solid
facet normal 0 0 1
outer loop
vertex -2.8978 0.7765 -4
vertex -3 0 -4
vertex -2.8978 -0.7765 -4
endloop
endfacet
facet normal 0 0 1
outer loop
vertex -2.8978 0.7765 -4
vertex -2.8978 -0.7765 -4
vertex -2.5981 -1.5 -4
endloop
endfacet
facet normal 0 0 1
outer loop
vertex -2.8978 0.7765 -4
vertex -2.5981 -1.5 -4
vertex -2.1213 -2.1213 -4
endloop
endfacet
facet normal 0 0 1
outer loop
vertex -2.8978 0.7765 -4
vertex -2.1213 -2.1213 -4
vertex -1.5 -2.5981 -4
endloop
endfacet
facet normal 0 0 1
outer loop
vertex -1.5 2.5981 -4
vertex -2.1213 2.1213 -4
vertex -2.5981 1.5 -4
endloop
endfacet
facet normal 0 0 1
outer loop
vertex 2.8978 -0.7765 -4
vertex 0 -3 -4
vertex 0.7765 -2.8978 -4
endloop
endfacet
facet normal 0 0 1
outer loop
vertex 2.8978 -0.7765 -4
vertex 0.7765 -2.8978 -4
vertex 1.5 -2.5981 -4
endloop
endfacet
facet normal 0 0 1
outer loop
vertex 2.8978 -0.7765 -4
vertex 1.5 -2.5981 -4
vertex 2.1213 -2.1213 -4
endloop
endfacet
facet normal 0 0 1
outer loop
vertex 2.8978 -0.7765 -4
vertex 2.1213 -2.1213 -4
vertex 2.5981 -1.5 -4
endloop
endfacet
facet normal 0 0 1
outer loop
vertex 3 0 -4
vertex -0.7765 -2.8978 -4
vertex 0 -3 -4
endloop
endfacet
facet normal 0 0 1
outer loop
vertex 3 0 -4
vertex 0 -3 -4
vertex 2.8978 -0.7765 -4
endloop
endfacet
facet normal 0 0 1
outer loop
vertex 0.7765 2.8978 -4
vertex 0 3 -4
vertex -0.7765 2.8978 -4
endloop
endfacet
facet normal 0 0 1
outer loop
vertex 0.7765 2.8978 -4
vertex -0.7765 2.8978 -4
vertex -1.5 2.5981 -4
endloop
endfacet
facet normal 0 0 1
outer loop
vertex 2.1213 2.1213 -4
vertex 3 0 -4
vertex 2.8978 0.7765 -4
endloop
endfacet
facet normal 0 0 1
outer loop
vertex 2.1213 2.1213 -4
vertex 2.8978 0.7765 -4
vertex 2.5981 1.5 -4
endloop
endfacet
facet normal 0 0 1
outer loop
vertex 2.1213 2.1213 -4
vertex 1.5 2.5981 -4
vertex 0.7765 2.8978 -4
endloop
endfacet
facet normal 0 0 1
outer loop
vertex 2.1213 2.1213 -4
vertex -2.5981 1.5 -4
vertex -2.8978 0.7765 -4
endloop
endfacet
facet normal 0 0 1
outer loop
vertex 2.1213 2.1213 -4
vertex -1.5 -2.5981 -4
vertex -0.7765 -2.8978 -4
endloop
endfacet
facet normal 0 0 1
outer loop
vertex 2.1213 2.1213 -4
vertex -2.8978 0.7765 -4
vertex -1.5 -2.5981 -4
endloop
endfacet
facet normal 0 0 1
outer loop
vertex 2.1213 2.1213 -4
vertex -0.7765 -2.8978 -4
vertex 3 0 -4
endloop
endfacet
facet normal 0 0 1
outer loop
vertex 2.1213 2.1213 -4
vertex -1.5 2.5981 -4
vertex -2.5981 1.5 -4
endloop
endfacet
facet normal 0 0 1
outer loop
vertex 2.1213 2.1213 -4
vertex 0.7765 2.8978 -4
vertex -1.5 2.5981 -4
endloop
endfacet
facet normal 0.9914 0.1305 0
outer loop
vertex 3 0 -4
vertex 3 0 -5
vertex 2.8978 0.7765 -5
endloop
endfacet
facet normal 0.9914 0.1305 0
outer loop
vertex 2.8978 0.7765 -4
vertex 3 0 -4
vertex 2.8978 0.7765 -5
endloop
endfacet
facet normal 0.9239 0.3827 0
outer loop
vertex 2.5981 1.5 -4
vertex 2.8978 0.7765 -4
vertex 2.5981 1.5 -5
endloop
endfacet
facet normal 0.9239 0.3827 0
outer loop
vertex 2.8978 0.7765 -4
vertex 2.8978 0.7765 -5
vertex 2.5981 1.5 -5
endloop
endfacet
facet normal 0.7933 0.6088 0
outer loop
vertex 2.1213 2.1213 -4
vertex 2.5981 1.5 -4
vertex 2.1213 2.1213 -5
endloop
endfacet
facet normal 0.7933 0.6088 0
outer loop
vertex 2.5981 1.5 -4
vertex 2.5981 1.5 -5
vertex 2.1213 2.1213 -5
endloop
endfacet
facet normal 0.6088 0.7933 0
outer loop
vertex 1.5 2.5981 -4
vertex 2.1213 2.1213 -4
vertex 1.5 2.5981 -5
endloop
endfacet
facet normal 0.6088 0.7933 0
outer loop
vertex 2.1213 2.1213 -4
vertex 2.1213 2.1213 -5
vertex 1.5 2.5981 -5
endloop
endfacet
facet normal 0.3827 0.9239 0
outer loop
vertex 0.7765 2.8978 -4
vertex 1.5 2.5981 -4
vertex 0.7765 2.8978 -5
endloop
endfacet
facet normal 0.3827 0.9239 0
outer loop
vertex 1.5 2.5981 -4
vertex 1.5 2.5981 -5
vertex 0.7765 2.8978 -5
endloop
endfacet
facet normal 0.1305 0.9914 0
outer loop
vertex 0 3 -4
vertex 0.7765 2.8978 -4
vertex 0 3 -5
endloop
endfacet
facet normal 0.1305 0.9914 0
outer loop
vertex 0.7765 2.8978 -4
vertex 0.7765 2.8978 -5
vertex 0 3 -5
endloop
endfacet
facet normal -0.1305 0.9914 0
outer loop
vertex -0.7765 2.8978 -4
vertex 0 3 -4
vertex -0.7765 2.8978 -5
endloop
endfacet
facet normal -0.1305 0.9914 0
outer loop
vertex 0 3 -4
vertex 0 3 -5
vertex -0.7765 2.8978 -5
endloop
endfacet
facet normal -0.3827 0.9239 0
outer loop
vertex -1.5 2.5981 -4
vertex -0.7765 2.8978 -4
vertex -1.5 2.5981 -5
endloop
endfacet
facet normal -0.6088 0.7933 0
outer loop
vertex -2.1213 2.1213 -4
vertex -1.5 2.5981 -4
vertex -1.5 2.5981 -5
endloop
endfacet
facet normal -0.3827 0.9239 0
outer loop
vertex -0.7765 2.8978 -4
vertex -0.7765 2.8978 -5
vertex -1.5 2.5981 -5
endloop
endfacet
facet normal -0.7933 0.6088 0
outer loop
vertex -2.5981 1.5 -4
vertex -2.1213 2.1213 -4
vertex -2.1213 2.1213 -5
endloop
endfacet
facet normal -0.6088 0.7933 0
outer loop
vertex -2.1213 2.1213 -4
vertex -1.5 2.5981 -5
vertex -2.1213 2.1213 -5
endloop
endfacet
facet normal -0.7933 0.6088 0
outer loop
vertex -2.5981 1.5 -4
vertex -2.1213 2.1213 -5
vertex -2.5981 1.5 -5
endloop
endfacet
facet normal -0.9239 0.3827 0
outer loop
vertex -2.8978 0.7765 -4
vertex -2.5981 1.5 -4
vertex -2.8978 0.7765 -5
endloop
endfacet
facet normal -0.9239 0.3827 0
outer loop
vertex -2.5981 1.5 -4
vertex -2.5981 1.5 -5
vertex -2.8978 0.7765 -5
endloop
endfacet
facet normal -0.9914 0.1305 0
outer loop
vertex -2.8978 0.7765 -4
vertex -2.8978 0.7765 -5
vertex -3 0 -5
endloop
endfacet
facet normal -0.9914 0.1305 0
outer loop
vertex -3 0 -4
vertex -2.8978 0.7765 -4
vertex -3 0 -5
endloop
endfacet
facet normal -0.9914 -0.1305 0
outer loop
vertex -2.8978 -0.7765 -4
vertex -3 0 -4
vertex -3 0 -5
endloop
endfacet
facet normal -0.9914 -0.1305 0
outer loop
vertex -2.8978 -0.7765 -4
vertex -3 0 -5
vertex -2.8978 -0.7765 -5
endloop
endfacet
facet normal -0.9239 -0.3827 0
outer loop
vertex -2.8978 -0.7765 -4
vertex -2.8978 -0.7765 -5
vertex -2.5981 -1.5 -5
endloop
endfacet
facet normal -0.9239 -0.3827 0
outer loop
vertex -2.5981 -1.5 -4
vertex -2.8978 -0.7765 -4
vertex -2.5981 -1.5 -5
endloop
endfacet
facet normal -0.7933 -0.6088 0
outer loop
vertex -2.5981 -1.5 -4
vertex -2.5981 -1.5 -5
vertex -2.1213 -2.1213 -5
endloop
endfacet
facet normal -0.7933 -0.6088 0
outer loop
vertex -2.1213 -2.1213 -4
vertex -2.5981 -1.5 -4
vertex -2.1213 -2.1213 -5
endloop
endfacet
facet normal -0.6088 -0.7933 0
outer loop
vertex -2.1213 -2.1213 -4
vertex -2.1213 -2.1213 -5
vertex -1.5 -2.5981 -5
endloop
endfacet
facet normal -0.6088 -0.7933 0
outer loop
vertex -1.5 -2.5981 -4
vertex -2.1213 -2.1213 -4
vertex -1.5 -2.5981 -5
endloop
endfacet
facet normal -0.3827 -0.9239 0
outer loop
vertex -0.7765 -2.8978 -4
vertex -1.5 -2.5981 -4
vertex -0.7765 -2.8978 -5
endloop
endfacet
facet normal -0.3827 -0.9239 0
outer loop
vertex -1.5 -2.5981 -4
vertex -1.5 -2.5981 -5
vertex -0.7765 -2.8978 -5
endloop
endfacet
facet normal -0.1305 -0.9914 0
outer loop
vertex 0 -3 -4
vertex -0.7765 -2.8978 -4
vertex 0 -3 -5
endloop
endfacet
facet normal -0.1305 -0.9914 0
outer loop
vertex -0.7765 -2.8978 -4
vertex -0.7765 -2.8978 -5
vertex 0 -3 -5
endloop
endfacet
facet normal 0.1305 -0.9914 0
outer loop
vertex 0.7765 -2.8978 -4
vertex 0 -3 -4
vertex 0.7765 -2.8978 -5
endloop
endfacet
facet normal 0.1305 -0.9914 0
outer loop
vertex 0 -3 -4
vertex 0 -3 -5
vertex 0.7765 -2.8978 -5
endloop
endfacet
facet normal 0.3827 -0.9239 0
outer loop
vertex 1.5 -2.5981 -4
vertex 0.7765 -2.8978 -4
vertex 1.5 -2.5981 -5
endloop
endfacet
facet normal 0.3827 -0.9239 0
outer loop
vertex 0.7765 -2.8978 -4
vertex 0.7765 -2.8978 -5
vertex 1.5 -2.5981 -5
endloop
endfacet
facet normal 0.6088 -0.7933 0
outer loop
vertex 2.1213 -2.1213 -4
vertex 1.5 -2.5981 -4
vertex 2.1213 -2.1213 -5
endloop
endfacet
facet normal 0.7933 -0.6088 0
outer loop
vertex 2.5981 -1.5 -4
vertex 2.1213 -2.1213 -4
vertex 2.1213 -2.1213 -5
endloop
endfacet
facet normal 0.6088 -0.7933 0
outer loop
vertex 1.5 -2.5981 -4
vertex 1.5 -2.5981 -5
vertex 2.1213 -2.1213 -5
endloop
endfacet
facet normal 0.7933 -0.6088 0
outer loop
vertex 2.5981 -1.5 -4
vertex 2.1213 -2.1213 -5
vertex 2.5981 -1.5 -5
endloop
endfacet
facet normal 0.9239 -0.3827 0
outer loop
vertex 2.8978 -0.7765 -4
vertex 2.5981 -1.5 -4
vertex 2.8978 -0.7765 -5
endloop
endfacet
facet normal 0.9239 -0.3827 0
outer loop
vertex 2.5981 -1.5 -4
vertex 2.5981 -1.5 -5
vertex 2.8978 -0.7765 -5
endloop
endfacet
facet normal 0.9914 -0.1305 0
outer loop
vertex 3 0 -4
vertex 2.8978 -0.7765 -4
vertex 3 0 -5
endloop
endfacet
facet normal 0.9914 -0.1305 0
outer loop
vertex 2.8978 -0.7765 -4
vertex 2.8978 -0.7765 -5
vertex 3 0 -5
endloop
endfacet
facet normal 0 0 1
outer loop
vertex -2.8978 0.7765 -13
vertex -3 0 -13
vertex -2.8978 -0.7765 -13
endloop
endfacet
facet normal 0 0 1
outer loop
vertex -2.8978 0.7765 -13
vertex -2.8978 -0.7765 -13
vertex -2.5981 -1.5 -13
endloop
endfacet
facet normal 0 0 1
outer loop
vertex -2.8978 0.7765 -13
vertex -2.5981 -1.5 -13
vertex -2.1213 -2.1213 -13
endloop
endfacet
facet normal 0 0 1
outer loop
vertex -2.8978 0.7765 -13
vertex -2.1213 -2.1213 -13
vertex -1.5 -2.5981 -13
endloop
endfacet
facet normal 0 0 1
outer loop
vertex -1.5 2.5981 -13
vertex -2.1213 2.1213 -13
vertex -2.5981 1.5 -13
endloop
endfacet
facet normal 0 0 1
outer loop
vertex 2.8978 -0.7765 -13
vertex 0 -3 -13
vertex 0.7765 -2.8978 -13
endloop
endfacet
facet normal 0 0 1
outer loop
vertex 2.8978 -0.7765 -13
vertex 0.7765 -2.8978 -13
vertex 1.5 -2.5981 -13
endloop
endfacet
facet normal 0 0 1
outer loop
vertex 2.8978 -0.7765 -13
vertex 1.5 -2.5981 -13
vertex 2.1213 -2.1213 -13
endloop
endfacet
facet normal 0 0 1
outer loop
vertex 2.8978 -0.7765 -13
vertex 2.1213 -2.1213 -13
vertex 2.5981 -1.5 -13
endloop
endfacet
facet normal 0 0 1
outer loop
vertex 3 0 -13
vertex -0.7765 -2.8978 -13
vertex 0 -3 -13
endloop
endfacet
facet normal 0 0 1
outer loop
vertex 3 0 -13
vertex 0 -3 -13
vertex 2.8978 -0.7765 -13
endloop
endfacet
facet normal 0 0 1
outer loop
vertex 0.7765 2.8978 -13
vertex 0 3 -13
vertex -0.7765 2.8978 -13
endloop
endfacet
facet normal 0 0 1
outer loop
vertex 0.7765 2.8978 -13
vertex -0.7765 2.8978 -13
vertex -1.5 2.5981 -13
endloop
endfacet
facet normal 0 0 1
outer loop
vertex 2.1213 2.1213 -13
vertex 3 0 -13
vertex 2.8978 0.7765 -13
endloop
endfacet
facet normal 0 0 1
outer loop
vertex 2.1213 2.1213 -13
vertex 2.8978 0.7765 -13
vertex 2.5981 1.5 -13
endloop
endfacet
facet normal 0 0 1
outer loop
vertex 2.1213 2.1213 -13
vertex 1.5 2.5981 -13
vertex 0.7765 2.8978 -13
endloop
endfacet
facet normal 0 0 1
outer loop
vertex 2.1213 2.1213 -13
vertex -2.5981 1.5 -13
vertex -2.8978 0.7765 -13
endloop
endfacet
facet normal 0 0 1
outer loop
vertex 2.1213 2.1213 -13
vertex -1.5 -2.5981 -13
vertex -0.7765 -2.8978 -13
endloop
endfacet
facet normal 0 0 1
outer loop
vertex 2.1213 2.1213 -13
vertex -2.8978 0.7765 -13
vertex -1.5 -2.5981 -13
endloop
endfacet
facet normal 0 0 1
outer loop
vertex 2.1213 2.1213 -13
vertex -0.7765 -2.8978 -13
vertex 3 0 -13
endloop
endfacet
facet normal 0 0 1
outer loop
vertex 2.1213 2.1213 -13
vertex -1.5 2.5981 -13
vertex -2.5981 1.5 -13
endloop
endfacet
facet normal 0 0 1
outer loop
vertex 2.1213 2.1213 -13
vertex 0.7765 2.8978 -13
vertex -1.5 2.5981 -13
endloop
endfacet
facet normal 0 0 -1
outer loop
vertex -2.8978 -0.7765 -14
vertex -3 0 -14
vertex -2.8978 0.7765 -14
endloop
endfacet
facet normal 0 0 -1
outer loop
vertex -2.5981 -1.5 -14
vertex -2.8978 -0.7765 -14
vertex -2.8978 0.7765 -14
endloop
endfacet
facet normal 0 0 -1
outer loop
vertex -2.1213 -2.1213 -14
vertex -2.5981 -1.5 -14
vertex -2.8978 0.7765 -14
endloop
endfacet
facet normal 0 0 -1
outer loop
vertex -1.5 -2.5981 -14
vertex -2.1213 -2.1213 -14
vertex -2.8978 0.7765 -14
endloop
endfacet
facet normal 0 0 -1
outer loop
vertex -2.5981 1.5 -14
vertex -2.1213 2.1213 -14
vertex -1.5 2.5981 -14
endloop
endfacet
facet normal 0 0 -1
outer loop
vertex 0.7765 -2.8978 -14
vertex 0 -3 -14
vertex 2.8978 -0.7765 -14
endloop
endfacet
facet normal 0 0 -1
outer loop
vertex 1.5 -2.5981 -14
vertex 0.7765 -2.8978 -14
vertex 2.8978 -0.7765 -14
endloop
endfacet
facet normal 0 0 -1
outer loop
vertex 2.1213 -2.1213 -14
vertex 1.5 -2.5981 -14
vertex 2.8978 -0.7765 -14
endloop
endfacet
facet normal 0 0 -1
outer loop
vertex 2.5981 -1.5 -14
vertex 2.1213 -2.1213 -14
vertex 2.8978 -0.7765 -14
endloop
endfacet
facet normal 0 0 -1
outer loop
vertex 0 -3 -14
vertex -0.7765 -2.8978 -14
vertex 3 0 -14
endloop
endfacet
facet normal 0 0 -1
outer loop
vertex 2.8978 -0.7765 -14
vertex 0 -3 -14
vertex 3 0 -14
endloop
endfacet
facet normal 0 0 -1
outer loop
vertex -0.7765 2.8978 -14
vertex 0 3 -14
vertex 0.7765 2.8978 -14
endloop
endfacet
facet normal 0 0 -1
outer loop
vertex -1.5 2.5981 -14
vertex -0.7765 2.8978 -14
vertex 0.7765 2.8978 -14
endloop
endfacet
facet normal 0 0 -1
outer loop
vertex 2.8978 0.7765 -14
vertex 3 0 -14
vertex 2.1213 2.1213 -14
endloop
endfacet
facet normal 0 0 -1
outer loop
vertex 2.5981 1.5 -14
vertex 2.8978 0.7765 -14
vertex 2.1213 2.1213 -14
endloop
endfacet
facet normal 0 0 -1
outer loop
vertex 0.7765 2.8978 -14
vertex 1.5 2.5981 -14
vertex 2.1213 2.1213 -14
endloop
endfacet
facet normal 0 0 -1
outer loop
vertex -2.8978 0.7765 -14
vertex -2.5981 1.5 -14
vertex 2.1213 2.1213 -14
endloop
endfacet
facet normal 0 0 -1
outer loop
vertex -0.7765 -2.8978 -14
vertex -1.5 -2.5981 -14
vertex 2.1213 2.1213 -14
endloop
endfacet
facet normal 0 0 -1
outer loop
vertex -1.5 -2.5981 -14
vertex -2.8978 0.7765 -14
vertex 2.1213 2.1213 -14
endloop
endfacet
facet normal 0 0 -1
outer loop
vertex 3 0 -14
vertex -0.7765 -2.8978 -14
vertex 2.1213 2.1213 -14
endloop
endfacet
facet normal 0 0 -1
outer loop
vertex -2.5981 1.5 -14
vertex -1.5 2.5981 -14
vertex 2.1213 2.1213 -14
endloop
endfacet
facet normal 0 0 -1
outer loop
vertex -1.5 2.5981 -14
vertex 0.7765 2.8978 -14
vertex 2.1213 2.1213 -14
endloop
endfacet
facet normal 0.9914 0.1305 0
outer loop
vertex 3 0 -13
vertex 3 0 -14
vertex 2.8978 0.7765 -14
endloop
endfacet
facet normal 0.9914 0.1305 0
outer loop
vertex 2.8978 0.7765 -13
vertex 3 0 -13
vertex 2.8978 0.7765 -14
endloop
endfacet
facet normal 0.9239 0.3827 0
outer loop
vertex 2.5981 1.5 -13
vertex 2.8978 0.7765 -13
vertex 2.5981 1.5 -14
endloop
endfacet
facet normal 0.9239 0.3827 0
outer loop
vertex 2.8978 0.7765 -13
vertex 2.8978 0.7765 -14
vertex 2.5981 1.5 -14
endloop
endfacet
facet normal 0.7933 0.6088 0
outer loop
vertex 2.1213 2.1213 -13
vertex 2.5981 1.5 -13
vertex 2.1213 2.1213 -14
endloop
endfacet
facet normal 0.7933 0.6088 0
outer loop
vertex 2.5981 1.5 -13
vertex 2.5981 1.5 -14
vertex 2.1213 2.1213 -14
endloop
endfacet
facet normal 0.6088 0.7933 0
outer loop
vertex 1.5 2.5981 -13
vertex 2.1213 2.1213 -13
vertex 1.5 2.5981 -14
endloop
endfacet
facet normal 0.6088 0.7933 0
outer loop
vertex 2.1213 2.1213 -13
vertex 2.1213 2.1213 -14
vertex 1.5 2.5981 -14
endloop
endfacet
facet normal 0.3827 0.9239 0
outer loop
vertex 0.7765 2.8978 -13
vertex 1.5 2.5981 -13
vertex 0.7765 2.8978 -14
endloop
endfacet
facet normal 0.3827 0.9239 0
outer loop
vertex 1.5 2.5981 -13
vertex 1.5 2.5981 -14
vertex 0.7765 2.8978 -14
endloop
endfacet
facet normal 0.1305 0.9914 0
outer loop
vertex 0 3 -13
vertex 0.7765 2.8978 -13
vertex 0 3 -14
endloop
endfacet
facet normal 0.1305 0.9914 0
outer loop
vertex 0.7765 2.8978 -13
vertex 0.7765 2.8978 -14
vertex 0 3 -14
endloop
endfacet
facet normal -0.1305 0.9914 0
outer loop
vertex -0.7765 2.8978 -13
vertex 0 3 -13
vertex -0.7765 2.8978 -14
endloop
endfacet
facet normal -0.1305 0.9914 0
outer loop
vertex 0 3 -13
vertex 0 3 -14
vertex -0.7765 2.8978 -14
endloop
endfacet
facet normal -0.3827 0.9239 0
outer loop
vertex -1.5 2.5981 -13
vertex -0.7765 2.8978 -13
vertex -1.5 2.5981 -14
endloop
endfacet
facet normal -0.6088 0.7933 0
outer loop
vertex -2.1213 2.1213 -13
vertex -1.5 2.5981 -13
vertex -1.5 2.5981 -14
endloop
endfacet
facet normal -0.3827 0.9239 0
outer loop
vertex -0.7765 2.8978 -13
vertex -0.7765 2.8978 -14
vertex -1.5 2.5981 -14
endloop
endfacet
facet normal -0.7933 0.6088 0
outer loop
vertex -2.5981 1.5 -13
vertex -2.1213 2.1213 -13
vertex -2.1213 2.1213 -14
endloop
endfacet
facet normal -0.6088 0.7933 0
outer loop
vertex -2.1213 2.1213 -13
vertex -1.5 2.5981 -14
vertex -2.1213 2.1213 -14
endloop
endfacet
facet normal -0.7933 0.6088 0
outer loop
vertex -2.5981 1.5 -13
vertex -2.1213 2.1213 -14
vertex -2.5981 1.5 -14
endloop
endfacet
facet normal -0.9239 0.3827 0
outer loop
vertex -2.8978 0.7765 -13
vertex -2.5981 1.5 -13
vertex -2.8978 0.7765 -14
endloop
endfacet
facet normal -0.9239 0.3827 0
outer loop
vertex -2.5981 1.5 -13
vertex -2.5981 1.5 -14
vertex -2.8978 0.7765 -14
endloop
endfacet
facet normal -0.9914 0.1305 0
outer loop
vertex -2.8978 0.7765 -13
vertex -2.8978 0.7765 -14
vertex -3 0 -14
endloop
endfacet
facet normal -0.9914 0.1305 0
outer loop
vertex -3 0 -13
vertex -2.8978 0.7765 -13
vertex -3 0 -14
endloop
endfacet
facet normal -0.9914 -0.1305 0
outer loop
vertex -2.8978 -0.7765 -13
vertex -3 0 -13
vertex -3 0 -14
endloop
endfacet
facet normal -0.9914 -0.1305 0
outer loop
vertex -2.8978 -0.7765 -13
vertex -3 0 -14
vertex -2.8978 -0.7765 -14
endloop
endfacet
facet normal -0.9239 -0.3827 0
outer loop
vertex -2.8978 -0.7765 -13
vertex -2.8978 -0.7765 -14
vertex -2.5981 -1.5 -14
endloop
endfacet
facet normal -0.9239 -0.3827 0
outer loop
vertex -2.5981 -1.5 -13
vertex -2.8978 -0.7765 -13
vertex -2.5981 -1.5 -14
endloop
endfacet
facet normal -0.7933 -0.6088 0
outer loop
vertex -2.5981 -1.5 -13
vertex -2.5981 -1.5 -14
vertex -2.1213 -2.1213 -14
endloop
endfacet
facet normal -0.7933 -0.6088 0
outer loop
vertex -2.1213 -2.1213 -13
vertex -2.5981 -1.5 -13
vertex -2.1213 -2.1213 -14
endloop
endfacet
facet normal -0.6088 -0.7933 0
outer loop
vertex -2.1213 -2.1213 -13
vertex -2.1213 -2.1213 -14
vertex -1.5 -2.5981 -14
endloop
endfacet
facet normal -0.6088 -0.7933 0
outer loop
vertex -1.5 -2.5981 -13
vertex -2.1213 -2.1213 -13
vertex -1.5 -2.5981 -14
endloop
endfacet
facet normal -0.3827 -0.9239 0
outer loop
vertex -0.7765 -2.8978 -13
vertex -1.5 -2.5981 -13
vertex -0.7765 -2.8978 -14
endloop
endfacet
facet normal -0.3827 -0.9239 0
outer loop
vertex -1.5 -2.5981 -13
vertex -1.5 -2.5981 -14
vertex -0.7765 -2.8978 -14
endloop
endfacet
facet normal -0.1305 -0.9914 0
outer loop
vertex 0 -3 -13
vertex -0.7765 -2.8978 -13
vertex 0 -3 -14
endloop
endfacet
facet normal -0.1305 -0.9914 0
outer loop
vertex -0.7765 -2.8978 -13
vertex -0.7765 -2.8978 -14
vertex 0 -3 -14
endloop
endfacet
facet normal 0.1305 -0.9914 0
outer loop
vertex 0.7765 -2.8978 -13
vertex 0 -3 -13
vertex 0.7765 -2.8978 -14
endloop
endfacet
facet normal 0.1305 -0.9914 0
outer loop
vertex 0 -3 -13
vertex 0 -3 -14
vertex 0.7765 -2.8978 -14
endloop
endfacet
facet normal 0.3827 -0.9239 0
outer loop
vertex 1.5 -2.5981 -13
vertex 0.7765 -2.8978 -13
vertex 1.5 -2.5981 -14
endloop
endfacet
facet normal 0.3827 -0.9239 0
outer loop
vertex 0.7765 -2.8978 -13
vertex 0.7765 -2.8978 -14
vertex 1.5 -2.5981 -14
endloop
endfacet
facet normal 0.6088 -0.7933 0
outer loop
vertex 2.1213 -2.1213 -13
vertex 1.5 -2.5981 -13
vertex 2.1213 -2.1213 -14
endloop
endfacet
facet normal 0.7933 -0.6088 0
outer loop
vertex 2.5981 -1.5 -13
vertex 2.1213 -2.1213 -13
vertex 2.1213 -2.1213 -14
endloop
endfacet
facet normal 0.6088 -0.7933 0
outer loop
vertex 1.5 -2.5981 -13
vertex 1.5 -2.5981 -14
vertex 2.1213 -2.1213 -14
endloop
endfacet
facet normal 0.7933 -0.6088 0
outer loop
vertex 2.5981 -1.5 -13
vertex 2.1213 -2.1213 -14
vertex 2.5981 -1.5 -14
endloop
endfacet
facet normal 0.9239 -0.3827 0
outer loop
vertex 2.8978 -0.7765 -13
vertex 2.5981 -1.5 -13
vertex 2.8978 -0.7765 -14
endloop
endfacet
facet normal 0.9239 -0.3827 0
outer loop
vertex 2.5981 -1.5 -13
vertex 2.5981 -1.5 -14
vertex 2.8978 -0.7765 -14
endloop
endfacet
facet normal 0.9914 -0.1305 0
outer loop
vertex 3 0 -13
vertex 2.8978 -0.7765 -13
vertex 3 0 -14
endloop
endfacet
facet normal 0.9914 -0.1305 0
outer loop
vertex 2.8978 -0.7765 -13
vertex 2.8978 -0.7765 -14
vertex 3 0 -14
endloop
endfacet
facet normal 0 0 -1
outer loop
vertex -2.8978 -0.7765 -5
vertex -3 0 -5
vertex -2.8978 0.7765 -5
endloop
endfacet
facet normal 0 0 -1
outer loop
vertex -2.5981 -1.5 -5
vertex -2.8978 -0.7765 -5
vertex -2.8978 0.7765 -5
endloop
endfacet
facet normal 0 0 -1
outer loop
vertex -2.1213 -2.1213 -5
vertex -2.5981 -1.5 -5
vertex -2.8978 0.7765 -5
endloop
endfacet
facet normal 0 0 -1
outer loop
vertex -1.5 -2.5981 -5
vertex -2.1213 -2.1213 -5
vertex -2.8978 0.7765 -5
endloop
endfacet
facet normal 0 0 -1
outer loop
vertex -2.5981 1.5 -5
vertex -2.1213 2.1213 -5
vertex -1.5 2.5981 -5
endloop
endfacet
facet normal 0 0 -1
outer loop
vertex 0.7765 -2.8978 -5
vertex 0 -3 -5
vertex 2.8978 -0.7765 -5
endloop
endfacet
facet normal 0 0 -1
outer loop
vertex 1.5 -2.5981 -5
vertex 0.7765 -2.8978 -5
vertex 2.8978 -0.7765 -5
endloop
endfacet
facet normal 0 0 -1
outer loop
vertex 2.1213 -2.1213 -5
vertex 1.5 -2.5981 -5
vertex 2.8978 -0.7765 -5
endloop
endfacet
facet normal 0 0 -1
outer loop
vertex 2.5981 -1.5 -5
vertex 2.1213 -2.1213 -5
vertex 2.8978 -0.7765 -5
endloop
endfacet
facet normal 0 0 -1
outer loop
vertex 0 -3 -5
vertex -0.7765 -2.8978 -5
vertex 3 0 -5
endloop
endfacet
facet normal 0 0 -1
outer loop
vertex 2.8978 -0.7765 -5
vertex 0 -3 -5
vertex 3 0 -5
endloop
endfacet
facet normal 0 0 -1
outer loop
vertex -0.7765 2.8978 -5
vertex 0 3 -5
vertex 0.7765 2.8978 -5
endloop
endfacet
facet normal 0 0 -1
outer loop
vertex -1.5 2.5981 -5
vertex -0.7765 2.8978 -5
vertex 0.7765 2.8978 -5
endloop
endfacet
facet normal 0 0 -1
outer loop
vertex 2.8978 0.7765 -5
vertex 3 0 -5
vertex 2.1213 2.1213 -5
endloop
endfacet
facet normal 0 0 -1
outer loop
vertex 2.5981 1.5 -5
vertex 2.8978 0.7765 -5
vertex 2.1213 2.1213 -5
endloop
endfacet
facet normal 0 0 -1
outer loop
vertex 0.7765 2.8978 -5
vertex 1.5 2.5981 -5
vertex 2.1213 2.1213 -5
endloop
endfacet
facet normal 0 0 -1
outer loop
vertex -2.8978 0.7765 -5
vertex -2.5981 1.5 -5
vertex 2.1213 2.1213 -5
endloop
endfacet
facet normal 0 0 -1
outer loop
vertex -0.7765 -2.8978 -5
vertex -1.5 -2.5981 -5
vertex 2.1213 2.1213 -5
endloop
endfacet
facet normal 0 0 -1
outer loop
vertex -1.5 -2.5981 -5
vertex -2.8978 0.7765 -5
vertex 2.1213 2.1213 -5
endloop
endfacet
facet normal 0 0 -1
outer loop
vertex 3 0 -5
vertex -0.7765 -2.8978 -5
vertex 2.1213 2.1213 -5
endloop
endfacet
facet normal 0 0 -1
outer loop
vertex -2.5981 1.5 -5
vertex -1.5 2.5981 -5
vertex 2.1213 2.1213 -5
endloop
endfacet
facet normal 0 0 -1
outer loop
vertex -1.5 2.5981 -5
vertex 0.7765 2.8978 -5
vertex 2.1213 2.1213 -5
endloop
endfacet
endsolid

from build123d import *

# Parameters (mm, degrees)
CYLINDER088_R     = 3
CYLINDER088_DEPTH = 1
CYLINDER089_R     = 3
CYLINDER089_DEPTH = 1


with BuildPart() as cylinder082:
    # Cylinder088 → Cylinder088 (new body)
    with BuildSketch(Plane.XY.offset(-5)):
        Circle(CYLINDER088_R)
    extrude(amount=CYLINDER088_DEPTH)


with BuildPart() as fusion103077013004017009:
    # Cylinder089 → Cylinder089 (new body)
    with BuildSketch(Plane.XY.offset(-14)):
        Circle(CYLINDER089_R)
    extrude(amount=CYLINDER089_DEPTH)

    # Fusion103077013004017009: union Cylinder082
    add(cylinder082.part)


solid = fusion103077013004017009.part
